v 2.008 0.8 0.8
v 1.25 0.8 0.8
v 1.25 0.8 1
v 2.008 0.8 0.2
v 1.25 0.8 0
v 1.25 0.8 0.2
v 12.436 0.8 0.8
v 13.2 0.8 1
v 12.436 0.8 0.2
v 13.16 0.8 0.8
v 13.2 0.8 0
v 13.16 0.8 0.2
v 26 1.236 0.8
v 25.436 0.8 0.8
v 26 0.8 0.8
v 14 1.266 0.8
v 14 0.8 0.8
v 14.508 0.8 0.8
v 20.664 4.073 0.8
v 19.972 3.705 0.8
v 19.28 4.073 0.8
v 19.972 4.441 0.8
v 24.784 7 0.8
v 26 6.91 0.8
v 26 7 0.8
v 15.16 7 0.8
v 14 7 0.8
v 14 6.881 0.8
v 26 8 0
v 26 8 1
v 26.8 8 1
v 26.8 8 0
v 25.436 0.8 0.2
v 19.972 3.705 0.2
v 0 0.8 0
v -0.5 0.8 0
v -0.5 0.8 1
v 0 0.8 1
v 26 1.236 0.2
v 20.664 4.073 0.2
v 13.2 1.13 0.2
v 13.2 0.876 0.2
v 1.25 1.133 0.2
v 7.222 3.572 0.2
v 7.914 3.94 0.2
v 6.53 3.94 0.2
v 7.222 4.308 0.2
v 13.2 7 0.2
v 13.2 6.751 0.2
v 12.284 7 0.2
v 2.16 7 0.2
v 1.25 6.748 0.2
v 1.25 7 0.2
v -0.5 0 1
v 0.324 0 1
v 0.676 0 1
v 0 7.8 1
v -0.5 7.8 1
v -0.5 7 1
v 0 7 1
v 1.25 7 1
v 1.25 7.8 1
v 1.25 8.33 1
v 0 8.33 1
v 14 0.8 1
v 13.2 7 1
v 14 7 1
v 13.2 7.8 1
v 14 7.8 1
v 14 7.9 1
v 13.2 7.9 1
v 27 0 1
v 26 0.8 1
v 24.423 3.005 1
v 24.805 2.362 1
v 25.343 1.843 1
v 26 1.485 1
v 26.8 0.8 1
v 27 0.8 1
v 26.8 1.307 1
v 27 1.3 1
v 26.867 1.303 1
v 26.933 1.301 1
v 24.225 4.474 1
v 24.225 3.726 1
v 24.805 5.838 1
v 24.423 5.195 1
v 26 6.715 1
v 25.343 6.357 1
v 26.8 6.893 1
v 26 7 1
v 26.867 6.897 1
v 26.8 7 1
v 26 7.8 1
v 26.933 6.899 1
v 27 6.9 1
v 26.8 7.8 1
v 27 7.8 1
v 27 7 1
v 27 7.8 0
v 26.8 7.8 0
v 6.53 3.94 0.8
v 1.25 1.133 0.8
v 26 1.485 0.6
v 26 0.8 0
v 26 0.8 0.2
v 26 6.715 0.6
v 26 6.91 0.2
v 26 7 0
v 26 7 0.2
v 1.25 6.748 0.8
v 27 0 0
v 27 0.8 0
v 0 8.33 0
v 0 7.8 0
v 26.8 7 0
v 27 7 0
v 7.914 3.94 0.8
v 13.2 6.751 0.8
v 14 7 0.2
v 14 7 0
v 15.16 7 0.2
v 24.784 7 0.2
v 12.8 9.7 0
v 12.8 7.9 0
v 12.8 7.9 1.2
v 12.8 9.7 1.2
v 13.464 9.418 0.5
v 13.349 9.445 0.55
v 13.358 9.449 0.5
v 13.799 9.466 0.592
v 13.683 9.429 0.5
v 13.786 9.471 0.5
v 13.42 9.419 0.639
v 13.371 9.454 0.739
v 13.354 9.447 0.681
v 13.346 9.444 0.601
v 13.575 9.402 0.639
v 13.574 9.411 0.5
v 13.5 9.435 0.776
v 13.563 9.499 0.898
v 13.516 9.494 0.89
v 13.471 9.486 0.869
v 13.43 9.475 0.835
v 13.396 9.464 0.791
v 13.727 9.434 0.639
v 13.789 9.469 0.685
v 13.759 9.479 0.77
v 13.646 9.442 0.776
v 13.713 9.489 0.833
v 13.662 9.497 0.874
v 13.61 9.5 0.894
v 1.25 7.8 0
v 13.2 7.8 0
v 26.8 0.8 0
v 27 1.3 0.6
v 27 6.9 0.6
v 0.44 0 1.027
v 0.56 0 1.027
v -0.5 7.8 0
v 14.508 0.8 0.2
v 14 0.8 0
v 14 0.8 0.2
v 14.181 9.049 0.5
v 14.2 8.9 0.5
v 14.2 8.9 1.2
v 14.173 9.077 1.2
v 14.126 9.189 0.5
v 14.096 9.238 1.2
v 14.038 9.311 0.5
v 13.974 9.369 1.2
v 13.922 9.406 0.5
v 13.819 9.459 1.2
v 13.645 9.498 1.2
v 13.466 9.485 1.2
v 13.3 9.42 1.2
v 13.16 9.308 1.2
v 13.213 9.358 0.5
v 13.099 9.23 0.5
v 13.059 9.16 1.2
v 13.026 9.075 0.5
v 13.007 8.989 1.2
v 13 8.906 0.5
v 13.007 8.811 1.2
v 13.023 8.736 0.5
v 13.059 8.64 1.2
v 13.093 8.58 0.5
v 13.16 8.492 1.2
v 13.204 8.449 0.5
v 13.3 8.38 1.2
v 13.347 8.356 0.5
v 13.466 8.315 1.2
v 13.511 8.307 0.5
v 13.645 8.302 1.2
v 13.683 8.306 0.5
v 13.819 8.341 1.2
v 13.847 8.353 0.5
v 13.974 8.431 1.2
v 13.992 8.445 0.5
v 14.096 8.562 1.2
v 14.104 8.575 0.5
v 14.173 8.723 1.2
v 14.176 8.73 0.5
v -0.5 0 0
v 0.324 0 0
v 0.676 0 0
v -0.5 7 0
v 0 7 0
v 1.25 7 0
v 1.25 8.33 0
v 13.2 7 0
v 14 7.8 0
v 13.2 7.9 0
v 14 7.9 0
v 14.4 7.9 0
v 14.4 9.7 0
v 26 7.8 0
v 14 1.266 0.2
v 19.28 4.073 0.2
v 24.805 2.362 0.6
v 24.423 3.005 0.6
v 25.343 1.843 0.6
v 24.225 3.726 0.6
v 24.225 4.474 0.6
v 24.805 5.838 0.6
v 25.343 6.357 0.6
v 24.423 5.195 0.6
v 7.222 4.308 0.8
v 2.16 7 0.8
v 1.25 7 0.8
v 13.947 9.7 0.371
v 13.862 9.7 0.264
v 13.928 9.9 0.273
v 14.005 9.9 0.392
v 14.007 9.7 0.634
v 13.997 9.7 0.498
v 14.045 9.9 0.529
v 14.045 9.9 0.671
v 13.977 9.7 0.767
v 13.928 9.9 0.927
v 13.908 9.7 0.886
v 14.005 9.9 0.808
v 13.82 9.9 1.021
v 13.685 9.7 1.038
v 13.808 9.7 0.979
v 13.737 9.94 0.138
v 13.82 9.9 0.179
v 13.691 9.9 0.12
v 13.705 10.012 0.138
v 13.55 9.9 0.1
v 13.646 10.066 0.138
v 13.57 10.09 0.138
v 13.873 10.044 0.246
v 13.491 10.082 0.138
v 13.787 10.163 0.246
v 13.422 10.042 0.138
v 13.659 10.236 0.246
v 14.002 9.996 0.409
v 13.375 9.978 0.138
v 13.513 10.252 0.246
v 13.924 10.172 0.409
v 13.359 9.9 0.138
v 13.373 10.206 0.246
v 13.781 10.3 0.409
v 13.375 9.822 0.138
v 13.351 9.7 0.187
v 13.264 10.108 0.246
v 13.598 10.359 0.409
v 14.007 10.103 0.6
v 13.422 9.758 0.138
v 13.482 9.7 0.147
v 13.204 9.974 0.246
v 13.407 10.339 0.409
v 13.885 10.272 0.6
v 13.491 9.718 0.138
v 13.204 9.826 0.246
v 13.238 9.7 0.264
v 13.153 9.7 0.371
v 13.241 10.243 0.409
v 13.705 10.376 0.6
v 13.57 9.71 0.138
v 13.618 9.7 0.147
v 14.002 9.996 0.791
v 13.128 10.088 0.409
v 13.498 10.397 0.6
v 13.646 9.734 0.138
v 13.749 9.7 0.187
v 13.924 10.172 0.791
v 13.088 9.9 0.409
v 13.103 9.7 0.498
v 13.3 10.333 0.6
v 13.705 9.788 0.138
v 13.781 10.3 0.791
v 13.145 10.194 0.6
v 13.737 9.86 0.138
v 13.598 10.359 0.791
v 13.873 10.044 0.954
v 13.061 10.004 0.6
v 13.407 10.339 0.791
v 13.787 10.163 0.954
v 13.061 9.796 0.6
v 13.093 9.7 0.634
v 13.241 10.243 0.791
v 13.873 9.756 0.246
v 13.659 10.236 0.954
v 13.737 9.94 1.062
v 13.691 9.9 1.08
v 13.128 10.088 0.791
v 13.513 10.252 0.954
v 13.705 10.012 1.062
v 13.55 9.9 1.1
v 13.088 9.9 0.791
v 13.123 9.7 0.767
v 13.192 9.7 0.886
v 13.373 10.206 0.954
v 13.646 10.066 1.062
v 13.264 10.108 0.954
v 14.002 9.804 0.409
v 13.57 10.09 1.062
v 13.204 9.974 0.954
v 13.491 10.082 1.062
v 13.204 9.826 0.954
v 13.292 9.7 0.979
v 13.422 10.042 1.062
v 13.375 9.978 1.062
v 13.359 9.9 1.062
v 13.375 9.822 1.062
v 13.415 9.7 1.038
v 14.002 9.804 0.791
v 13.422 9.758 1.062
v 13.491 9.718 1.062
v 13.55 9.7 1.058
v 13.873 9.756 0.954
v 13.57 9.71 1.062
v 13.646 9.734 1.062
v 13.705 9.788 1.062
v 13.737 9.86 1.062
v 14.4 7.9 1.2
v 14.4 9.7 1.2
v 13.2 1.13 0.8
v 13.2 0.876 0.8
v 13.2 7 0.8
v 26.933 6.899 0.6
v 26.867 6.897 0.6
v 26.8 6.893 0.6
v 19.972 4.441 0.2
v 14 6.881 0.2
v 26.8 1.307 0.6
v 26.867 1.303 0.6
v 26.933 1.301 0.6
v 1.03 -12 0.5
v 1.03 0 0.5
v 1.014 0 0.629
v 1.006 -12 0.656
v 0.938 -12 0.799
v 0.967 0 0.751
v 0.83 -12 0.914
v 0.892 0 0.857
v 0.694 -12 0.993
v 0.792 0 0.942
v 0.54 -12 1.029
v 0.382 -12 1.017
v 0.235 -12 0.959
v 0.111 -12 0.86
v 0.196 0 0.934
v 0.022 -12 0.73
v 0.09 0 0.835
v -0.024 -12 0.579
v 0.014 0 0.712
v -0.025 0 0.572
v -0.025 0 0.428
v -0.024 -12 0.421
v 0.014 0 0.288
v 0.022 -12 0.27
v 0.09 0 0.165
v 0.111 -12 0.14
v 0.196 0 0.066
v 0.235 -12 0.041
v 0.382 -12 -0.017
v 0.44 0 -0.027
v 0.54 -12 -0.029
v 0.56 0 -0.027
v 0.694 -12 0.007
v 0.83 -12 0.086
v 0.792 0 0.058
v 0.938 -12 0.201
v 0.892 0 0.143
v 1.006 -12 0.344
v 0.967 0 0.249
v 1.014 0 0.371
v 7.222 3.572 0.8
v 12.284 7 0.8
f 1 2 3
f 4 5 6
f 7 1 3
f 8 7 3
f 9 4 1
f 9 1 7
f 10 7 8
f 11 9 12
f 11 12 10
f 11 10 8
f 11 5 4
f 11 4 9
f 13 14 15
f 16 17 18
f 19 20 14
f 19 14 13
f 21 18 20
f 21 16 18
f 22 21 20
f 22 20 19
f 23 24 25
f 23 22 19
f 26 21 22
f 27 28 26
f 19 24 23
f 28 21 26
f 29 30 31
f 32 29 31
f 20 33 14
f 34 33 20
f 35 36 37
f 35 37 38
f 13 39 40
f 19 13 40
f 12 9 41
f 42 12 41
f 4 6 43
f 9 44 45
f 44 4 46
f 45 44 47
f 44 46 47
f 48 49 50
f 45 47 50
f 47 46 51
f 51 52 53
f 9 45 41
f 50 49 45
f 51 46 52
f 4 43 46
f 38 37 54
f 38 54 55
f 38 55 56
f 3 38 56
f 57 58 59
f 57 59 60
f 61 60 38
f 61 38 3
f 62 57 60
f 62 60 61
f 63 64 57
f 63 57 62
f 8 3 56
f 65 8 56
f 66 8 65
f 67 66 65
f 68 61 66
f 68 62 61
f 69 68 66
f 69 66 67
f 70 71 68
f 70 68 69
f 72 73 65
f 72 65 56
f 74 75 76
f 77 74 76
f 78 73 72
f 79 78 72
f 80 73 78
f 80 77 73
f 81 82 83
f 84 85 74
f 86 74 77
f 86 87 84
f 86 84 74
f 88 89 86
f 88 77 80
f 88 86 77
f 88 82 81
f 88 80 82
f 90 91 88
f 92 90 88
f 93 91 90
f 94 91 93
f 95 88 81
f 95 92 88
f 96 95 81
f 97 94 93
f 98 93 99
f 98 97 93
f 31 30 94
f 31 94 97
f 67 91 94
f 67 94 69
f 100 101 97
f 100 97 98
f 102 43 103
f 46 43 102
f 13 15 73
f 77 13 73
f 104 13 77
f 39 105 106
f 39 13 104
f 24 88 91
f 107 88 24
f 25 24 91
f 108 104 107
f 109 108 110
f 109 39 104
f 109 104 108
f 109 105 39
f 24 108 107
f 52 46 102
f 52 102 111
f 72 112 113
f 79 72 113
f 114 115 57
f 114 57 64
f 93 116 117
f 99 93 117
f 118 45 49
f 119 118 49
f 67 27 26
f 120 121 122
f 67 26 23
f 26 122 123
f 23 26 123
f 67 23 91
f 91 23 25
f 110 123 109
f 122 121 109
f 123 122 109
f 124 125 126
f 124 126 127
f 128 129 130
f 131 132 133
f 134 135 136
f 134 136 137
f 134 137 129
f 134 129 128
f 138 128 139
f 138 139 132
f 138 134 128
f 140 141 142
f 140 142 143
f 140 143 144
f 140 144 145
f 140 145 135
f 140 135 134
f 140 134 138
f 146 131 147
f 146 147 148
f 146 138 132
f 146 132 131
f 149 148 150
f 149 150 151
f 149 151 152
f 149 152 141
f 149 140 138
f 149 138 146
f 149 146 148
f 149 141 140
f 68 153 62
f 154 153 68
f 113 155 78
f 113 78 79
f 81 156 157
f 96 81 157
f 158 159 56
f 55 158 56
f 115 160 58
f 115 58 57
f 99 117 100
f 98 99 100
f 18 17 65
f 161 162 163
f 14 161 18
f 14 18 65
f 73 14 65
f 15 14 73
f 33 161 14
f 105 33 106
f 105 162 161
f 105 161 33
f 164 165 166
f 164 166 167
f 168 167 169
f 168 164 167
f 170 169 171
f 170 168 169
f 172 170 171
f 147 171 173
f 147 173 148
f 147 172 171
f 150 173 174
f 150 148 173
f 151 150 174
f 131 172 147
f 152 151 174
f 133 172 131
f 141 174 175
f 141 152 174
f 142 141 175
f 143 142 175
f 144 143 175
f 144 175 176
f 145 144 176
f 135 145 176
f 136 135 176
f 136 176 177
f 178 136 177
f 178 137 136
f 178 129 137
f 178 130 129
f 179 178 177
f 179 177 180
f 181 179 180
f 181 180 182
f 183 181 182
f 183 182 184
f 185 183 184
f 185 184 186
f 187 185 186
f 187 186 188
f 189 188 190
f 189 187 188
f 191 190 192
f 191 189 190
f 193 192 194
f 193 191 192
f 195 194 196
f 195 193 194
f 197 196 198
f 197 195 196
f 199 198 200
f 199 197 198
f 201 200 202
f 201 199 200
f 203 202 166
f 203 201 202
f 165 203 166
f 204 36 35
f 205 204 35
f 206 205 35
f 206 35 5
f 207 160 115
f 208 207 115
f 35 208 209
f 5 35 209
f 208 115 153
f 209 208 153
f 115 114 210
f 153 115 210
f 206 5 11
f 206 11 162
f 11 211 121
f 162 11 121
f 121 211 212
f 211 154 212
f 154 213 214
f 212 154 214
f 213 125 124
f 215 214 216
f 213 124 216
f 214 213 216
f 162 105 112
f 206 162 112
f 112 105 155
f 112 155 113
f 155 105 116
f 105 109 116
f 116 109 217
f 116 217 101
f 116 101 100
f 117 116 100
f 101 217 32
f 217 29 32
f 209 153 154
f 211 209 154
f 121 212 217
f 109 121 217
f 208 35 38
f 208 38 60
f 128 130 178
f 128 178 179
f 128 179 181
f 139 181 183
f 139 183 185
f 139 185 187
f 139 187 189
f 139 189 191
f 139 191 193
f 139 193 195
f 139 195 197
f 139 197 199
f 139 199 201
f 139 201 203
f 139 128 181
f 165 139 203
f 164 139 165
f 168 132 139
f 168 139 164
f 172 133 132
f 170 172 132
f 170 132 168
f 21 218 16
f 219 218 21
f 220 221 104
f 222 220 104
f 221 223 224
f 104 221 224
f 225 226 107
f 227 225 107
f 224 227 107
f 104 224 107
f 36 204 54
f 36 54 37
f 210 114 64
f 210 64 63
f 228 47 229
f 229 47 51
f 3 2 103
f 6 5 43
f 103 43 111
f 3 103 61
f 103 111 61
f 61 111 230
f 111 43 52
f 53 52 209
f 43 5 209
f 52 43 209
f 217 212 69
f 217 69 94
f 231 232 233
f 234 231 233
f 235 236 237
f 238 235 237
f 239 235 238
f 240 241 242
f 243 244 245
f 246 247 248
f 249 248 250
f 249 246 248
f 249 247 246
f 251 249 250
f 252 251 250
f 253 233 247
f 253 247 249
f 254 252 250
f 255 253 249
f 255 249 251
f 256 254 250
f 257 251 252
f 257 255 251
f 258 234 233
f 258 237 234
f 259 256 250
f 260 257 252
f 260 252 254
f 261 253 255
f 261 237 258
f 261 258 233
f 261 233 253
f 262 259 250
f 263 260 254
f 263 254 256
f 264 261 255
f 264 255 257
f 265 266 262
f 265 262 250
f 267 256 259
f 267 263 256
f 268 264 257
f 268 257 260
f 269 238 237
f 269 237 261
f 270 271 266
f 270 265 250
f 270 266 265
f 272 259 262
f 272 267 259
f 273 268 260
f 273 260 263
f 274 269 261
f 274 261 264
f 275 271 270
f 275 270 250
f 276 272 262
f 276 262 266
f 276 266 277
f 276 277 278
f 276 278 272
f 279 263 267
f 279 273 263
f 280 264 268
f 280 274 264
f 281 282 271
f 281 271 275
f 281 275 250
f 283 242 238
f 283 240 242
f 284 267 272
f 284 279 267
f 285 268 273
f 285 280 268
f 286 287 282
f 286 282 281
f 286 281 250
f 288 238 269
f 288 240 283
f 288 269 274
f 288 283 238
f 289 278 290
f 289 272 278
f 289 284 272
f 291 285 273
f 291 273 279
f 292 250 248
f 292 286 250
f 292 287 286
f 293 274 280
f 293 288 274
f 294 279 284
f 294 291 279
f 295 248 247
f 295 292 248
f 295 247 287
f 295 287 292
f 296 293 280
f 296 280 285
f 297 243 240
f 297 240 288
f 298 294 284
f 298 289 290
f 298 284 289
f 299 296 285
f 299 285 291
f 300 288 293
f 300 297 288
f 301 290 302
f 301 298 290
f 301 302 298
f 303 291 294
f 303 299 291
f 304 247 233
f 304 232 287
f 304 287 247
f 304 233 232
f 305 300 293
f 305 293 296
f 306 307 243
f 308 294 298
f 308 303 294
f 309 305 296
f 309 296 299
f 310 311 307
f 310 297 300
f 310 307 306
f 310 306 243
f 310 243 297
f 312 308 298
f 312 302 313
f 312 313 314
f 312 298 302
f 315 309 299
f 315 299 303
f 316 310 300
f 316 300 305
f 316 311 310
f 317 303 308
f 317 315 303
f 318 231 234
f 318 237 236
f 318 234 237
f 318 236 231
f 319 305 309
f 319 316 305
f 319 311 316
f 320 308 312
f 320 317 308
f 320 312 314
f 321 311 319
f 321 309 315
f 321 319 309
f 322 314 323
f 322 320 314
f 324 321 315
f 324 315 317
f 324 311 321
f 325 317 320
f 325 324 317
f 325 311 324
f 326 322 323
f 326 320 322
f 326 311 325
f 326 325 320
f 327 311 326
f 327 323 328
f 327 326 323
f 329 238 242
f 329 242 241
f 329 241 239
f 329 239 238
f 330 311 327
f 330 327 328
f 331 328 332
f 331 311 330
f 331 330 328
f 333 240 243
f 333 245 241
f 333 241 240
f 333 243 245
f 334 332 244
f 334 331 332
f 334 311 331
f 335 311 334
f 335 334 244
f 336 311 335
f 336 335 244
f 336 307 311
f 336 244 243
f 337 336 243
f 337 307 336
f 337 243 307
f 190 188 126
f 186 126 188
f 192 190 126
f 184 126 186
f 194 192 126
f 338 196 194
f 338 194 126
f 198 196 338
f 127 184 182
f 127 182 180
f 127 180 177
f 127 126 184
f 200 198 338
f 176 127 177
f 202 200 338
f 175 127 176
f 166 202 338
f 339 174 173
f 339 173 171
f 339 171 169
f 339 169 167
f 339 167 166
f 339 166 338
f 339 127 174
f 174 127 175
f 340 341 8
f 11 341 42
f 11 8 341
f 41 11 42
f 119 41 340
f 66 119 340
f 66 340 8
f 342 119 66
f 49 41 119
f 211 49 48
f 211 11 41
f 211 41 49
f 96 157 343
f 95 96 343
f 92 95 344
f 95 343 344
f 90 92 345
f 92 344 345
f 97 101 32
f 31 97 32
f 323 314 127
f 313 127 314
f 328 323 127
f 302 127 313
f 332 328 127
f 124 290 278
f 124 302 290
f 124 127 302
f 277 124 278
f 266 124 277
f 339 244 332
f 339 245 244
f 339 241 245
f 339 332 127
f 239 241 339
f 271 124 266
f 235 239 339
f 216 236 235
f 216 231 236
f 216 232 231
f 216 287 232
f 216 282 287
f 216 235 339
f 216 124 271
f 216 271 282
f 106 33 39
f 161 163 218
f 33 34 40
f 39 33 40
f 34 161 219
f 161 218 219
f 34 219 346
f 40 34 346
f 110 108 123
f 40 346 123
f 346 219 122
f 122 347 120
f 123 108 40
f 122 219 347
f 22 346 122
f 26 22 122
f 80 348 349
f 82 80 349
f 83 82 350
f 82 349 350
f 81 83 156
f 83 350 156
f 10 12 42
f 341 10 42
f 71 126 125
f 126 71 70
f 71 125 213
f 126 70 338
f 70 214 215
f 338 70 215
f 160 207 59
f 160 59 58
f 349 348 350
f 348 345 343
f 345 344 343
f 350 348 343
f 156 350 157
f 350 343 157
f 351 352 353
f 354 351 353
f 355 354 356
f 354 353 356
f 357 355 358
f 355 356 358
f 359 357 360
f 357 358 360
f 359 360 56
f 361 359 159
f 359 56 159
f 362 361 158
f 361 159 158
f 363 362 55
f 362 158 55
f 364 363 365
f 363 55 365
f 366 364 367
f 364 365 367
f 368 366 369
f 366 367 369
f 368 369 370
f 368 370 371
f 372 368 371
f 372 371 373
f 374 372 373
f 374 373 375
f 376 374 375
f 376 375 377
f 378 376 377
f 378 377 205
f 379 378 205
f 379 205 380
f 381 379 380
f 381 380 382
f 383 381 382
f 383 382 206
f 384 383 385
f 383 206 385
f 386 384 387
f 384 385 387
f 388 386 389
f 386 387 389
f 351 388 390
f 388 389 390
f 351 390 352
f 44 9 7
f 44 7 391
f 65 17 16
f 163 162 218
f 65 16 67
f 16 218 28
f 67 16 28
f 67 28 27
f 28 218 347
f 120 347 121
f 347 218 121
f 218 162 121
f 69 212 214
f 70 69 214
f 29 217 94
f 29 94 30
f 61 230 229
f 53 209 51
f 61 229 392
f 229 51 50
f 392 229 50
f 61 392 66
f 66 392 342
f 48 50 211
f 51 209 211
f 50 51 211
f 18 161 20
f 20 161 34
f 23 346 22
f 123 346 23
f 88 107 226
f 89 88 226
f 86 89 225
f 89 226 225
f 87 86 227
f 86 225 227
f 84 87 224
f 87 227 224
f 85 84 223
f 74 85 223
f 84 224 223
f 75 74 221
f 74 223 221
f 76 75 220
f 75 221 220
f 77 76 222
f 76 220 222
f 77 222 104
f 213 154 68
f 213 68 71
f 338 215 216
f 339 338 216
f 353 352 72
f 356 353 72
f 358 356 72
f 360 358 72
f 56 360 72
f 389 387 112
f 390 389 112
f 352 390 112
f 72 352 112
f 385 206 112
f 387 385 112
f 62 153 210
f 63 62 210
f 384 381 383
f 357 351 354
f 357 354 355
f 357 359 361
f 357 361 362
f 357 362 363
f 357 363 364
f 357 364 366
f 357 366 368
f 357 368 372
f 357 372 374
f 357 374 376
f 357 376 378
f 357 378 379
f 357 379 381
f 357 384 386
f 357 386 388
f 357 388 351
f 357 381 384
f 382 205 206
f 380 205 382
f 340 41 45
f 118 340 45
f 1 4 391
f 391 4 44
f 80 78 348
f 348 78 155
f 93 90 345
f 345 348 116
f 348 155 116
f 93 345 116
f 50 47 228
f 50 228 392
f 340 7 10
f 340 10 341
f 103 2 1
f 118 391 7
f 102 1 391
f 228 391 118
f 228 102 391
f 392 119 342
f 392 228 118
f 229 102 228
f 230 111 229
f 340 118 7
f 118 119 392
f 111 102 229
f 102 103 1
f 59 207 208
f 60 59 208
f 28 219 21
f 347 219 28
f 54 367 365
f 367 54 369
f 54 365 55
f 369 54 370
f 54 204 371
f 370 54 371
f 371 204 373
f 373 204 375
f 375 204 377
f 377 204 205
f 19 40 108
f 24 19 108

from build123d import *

# Parameters (mm, degrees)
SKETCH_W               = 1.25
SKETCH_H               = 8.33
PAD_DEPTH              = 1
BOX_W                  = 27.5
BOX_H                  = 0.8
BOX_DEPTH              = 1
LINEARPATTERN_COUNT    = 2
LINEARPATTERN_PITCH    = 7
BOX001_W               = 0.8
BOX001_H               = 8
BOX001_DEPTH           = 1
BOX002_W               = 0.8
BOX002_H               = 8
BOX002_DEPTH           = 1
BOX003_W               = 0.65
BOX003_H               = 14
BOX003_DEPTH           = 0.6
LINEARPATTERN001_COUNT = 2
LINEARPATTERN001_PITCH = 12.5
BOX004_W               = 0.65
BOX004_H               = 14
BOX004_DEPTH           = 0.6
LINEARPATTERN002_COUNT = 2
LINEARPATTERN002_PITCH = 13
CYLINDER_R             = 0.53
CYLINDER_DEPTH         = 12
CYLINDER001_R          = 2.8
CYLINDER001_DEPTH      = 0.4
BOX005_W               = 1.6
BOX005_H               = 1.8
BOX005_DEPTH           = 1.2
CYLINDER002_R          = 0.6
CYLINDER002_DEPTH      = 2
BOX006_W               = 4
BOX006_H               = 6
BOX006_DEPTH           = 1


with BuildPart() as part:
    # Sketch → Pad (new body)
    with BuildSketch(Plane.XY):
        with Locations((0.625, 4.165)):
            Rectangle(SKETCH_W, SKETCH_H)
    extrude(amount=PAD_DEPTH)

    # Box → Box (join)
    with BuildSketch(Plane(origin=(-0.5, 0, 0), x_dir=(1, 0, 0), z_dir=(0, 0, 1))):
        with Locations((13.75, 0.4)):
            Rectangle(BOX_W, BOX_H)
    box = extrude(amount=BOX_DEPTH)

    # LinearPattern: Box ×2
    with Locations(*[(0, i * LINEARPATTERN_PITCH, 0) for i in range(1, LINEARPATTERN_COUNT)]):
        add(box)

    # Box001 → Box001 (join)
    with BuildSketch(Plane(origin=(13.2, 0, 0), x_dir=(1, 0, 0), z_dir=(0, 0, 1))):
        with Locations((0.4, 4)):
            Rectangle(BOX001_W, BOX001_H)
    extrude(amount=BOX001_DEPTH)

    # Box002 → Box002 (join)
    with BuildSketch(Plane(origin=(26, 0, 0), x_dir=(1, 0, 0), z_dir=(0, 0, 1))):
        with Locations((0.4, 4)):
            Rectangle(BOX002_W, BOX002_H)
    extrude(amount=BOX002_DEPTH)

    # Box003 → Box003 (join)
    with BuildSketch(Plane(origin=(1, 1, 0.2), x_dir=(0.469472, -0.882948, 0), z_dir=(0, 0, 1))):
        with Locations((0.325, 7)):
            Rectangle(BOX003_W, BOX003_H)
    box003 = extrude(amount=BOX003_DEPTH)

    # LinearPattern001: Box003 ×2
    with Locations(*[(i * LINEARPATTERN001_PITCH, 0, 0) for i in range(1, LINEARPATTERN001_COUNT)]):
        add(box003)

    # Box004 → Box004 (join)
    with BuildSketch(Plane(origin=(13, 0.5, 0.2), x_dir=(0.469472, 0.882948, 0), z_dir=(0, 0, 1))):
        with Locations((0.325, 7)):
            Rectangle(BOX004_W, BOX004_H)
    box004 = extrude(amount=BOX004_DEPTH)

    # LinearPattern002: Box004 ×2
    with Locations(*[(i * LINEARPATTERN002_PITCH, 0, 0) for i in range(1, LINEARPATTERN002_COUNT)]):
        add(box004)

    # Cylinder → Cylinder (join)
    with BuildSketch(Plane(origin=(0.5, 0, 0.5), x_dir=(1, 0, 0), z_dir=(0, -1, 0))):
        Circle(CYLINDER_R)
    extrude(amount=CYLINDER_DEPTH)

    # Cylinder001 → Cylinder001 (join)
    with BuildSketch(Plane(origin=(27, 4.1, 0.6), x_dir=(1, 0, 0), z_dir=(0, 0, 1))):
        Circle(CYLINDER001_R)
    extrude(amount=CYLINDER001_DEPTH)

    # Box005 → Box005 (join)
    with BuildSketch(Plane(origin=(12.8, 7.9, 0), x_dir=(1, 0, 0), z_dir=(0, 0, 1))):
        with Locations((0.8, 0.9)):
            Rectangle(BOX005_W, BOX005_H)
    extrude(amount=BOX005_DEPTH)

    # Cylinder002 → Cylinder002 (cut)
    with BuildSketch(Plane(origin=(13.6, 8.9, 0.5), x_dir=(1, 0, 0), z_dir=(0, 0, 1))):
        Circle(CYLINDER002_R)
    extrude(amount=CYLINDER002_DEPTH, mode=Mode.SUBTRACT)

    # Box006 → Box006 (cut)
    with BuildSketch(Plane(origin=(27, 1, 0), x_dir=(1, 0, 0), z_dir=(0, 0, 1))):
        with Locations((2, 3)):
            Rectangle(BOX006_W, BOX006_H)
    extrude(amount=BOX006_DEPTH, mode=Mode.SUBTRACT)

    # Sphere → Sphere (revolve)
    with BuildSketch(Plane(origin=(13.55, 9.9, 0.6), x_dir=(1, 0, 0), z_dir=(0, -1, 0))):
        with BuildLine():
            ThreePointArc((0, -0.5), (0.5, 0), (0, 0.5))
            Line((0, 0.5), (0, -0.5))
        make_face()
    revolve(axis=Axis((13.55, 9.9, 0.6), (0, 0, 1)))


solid = part.part
